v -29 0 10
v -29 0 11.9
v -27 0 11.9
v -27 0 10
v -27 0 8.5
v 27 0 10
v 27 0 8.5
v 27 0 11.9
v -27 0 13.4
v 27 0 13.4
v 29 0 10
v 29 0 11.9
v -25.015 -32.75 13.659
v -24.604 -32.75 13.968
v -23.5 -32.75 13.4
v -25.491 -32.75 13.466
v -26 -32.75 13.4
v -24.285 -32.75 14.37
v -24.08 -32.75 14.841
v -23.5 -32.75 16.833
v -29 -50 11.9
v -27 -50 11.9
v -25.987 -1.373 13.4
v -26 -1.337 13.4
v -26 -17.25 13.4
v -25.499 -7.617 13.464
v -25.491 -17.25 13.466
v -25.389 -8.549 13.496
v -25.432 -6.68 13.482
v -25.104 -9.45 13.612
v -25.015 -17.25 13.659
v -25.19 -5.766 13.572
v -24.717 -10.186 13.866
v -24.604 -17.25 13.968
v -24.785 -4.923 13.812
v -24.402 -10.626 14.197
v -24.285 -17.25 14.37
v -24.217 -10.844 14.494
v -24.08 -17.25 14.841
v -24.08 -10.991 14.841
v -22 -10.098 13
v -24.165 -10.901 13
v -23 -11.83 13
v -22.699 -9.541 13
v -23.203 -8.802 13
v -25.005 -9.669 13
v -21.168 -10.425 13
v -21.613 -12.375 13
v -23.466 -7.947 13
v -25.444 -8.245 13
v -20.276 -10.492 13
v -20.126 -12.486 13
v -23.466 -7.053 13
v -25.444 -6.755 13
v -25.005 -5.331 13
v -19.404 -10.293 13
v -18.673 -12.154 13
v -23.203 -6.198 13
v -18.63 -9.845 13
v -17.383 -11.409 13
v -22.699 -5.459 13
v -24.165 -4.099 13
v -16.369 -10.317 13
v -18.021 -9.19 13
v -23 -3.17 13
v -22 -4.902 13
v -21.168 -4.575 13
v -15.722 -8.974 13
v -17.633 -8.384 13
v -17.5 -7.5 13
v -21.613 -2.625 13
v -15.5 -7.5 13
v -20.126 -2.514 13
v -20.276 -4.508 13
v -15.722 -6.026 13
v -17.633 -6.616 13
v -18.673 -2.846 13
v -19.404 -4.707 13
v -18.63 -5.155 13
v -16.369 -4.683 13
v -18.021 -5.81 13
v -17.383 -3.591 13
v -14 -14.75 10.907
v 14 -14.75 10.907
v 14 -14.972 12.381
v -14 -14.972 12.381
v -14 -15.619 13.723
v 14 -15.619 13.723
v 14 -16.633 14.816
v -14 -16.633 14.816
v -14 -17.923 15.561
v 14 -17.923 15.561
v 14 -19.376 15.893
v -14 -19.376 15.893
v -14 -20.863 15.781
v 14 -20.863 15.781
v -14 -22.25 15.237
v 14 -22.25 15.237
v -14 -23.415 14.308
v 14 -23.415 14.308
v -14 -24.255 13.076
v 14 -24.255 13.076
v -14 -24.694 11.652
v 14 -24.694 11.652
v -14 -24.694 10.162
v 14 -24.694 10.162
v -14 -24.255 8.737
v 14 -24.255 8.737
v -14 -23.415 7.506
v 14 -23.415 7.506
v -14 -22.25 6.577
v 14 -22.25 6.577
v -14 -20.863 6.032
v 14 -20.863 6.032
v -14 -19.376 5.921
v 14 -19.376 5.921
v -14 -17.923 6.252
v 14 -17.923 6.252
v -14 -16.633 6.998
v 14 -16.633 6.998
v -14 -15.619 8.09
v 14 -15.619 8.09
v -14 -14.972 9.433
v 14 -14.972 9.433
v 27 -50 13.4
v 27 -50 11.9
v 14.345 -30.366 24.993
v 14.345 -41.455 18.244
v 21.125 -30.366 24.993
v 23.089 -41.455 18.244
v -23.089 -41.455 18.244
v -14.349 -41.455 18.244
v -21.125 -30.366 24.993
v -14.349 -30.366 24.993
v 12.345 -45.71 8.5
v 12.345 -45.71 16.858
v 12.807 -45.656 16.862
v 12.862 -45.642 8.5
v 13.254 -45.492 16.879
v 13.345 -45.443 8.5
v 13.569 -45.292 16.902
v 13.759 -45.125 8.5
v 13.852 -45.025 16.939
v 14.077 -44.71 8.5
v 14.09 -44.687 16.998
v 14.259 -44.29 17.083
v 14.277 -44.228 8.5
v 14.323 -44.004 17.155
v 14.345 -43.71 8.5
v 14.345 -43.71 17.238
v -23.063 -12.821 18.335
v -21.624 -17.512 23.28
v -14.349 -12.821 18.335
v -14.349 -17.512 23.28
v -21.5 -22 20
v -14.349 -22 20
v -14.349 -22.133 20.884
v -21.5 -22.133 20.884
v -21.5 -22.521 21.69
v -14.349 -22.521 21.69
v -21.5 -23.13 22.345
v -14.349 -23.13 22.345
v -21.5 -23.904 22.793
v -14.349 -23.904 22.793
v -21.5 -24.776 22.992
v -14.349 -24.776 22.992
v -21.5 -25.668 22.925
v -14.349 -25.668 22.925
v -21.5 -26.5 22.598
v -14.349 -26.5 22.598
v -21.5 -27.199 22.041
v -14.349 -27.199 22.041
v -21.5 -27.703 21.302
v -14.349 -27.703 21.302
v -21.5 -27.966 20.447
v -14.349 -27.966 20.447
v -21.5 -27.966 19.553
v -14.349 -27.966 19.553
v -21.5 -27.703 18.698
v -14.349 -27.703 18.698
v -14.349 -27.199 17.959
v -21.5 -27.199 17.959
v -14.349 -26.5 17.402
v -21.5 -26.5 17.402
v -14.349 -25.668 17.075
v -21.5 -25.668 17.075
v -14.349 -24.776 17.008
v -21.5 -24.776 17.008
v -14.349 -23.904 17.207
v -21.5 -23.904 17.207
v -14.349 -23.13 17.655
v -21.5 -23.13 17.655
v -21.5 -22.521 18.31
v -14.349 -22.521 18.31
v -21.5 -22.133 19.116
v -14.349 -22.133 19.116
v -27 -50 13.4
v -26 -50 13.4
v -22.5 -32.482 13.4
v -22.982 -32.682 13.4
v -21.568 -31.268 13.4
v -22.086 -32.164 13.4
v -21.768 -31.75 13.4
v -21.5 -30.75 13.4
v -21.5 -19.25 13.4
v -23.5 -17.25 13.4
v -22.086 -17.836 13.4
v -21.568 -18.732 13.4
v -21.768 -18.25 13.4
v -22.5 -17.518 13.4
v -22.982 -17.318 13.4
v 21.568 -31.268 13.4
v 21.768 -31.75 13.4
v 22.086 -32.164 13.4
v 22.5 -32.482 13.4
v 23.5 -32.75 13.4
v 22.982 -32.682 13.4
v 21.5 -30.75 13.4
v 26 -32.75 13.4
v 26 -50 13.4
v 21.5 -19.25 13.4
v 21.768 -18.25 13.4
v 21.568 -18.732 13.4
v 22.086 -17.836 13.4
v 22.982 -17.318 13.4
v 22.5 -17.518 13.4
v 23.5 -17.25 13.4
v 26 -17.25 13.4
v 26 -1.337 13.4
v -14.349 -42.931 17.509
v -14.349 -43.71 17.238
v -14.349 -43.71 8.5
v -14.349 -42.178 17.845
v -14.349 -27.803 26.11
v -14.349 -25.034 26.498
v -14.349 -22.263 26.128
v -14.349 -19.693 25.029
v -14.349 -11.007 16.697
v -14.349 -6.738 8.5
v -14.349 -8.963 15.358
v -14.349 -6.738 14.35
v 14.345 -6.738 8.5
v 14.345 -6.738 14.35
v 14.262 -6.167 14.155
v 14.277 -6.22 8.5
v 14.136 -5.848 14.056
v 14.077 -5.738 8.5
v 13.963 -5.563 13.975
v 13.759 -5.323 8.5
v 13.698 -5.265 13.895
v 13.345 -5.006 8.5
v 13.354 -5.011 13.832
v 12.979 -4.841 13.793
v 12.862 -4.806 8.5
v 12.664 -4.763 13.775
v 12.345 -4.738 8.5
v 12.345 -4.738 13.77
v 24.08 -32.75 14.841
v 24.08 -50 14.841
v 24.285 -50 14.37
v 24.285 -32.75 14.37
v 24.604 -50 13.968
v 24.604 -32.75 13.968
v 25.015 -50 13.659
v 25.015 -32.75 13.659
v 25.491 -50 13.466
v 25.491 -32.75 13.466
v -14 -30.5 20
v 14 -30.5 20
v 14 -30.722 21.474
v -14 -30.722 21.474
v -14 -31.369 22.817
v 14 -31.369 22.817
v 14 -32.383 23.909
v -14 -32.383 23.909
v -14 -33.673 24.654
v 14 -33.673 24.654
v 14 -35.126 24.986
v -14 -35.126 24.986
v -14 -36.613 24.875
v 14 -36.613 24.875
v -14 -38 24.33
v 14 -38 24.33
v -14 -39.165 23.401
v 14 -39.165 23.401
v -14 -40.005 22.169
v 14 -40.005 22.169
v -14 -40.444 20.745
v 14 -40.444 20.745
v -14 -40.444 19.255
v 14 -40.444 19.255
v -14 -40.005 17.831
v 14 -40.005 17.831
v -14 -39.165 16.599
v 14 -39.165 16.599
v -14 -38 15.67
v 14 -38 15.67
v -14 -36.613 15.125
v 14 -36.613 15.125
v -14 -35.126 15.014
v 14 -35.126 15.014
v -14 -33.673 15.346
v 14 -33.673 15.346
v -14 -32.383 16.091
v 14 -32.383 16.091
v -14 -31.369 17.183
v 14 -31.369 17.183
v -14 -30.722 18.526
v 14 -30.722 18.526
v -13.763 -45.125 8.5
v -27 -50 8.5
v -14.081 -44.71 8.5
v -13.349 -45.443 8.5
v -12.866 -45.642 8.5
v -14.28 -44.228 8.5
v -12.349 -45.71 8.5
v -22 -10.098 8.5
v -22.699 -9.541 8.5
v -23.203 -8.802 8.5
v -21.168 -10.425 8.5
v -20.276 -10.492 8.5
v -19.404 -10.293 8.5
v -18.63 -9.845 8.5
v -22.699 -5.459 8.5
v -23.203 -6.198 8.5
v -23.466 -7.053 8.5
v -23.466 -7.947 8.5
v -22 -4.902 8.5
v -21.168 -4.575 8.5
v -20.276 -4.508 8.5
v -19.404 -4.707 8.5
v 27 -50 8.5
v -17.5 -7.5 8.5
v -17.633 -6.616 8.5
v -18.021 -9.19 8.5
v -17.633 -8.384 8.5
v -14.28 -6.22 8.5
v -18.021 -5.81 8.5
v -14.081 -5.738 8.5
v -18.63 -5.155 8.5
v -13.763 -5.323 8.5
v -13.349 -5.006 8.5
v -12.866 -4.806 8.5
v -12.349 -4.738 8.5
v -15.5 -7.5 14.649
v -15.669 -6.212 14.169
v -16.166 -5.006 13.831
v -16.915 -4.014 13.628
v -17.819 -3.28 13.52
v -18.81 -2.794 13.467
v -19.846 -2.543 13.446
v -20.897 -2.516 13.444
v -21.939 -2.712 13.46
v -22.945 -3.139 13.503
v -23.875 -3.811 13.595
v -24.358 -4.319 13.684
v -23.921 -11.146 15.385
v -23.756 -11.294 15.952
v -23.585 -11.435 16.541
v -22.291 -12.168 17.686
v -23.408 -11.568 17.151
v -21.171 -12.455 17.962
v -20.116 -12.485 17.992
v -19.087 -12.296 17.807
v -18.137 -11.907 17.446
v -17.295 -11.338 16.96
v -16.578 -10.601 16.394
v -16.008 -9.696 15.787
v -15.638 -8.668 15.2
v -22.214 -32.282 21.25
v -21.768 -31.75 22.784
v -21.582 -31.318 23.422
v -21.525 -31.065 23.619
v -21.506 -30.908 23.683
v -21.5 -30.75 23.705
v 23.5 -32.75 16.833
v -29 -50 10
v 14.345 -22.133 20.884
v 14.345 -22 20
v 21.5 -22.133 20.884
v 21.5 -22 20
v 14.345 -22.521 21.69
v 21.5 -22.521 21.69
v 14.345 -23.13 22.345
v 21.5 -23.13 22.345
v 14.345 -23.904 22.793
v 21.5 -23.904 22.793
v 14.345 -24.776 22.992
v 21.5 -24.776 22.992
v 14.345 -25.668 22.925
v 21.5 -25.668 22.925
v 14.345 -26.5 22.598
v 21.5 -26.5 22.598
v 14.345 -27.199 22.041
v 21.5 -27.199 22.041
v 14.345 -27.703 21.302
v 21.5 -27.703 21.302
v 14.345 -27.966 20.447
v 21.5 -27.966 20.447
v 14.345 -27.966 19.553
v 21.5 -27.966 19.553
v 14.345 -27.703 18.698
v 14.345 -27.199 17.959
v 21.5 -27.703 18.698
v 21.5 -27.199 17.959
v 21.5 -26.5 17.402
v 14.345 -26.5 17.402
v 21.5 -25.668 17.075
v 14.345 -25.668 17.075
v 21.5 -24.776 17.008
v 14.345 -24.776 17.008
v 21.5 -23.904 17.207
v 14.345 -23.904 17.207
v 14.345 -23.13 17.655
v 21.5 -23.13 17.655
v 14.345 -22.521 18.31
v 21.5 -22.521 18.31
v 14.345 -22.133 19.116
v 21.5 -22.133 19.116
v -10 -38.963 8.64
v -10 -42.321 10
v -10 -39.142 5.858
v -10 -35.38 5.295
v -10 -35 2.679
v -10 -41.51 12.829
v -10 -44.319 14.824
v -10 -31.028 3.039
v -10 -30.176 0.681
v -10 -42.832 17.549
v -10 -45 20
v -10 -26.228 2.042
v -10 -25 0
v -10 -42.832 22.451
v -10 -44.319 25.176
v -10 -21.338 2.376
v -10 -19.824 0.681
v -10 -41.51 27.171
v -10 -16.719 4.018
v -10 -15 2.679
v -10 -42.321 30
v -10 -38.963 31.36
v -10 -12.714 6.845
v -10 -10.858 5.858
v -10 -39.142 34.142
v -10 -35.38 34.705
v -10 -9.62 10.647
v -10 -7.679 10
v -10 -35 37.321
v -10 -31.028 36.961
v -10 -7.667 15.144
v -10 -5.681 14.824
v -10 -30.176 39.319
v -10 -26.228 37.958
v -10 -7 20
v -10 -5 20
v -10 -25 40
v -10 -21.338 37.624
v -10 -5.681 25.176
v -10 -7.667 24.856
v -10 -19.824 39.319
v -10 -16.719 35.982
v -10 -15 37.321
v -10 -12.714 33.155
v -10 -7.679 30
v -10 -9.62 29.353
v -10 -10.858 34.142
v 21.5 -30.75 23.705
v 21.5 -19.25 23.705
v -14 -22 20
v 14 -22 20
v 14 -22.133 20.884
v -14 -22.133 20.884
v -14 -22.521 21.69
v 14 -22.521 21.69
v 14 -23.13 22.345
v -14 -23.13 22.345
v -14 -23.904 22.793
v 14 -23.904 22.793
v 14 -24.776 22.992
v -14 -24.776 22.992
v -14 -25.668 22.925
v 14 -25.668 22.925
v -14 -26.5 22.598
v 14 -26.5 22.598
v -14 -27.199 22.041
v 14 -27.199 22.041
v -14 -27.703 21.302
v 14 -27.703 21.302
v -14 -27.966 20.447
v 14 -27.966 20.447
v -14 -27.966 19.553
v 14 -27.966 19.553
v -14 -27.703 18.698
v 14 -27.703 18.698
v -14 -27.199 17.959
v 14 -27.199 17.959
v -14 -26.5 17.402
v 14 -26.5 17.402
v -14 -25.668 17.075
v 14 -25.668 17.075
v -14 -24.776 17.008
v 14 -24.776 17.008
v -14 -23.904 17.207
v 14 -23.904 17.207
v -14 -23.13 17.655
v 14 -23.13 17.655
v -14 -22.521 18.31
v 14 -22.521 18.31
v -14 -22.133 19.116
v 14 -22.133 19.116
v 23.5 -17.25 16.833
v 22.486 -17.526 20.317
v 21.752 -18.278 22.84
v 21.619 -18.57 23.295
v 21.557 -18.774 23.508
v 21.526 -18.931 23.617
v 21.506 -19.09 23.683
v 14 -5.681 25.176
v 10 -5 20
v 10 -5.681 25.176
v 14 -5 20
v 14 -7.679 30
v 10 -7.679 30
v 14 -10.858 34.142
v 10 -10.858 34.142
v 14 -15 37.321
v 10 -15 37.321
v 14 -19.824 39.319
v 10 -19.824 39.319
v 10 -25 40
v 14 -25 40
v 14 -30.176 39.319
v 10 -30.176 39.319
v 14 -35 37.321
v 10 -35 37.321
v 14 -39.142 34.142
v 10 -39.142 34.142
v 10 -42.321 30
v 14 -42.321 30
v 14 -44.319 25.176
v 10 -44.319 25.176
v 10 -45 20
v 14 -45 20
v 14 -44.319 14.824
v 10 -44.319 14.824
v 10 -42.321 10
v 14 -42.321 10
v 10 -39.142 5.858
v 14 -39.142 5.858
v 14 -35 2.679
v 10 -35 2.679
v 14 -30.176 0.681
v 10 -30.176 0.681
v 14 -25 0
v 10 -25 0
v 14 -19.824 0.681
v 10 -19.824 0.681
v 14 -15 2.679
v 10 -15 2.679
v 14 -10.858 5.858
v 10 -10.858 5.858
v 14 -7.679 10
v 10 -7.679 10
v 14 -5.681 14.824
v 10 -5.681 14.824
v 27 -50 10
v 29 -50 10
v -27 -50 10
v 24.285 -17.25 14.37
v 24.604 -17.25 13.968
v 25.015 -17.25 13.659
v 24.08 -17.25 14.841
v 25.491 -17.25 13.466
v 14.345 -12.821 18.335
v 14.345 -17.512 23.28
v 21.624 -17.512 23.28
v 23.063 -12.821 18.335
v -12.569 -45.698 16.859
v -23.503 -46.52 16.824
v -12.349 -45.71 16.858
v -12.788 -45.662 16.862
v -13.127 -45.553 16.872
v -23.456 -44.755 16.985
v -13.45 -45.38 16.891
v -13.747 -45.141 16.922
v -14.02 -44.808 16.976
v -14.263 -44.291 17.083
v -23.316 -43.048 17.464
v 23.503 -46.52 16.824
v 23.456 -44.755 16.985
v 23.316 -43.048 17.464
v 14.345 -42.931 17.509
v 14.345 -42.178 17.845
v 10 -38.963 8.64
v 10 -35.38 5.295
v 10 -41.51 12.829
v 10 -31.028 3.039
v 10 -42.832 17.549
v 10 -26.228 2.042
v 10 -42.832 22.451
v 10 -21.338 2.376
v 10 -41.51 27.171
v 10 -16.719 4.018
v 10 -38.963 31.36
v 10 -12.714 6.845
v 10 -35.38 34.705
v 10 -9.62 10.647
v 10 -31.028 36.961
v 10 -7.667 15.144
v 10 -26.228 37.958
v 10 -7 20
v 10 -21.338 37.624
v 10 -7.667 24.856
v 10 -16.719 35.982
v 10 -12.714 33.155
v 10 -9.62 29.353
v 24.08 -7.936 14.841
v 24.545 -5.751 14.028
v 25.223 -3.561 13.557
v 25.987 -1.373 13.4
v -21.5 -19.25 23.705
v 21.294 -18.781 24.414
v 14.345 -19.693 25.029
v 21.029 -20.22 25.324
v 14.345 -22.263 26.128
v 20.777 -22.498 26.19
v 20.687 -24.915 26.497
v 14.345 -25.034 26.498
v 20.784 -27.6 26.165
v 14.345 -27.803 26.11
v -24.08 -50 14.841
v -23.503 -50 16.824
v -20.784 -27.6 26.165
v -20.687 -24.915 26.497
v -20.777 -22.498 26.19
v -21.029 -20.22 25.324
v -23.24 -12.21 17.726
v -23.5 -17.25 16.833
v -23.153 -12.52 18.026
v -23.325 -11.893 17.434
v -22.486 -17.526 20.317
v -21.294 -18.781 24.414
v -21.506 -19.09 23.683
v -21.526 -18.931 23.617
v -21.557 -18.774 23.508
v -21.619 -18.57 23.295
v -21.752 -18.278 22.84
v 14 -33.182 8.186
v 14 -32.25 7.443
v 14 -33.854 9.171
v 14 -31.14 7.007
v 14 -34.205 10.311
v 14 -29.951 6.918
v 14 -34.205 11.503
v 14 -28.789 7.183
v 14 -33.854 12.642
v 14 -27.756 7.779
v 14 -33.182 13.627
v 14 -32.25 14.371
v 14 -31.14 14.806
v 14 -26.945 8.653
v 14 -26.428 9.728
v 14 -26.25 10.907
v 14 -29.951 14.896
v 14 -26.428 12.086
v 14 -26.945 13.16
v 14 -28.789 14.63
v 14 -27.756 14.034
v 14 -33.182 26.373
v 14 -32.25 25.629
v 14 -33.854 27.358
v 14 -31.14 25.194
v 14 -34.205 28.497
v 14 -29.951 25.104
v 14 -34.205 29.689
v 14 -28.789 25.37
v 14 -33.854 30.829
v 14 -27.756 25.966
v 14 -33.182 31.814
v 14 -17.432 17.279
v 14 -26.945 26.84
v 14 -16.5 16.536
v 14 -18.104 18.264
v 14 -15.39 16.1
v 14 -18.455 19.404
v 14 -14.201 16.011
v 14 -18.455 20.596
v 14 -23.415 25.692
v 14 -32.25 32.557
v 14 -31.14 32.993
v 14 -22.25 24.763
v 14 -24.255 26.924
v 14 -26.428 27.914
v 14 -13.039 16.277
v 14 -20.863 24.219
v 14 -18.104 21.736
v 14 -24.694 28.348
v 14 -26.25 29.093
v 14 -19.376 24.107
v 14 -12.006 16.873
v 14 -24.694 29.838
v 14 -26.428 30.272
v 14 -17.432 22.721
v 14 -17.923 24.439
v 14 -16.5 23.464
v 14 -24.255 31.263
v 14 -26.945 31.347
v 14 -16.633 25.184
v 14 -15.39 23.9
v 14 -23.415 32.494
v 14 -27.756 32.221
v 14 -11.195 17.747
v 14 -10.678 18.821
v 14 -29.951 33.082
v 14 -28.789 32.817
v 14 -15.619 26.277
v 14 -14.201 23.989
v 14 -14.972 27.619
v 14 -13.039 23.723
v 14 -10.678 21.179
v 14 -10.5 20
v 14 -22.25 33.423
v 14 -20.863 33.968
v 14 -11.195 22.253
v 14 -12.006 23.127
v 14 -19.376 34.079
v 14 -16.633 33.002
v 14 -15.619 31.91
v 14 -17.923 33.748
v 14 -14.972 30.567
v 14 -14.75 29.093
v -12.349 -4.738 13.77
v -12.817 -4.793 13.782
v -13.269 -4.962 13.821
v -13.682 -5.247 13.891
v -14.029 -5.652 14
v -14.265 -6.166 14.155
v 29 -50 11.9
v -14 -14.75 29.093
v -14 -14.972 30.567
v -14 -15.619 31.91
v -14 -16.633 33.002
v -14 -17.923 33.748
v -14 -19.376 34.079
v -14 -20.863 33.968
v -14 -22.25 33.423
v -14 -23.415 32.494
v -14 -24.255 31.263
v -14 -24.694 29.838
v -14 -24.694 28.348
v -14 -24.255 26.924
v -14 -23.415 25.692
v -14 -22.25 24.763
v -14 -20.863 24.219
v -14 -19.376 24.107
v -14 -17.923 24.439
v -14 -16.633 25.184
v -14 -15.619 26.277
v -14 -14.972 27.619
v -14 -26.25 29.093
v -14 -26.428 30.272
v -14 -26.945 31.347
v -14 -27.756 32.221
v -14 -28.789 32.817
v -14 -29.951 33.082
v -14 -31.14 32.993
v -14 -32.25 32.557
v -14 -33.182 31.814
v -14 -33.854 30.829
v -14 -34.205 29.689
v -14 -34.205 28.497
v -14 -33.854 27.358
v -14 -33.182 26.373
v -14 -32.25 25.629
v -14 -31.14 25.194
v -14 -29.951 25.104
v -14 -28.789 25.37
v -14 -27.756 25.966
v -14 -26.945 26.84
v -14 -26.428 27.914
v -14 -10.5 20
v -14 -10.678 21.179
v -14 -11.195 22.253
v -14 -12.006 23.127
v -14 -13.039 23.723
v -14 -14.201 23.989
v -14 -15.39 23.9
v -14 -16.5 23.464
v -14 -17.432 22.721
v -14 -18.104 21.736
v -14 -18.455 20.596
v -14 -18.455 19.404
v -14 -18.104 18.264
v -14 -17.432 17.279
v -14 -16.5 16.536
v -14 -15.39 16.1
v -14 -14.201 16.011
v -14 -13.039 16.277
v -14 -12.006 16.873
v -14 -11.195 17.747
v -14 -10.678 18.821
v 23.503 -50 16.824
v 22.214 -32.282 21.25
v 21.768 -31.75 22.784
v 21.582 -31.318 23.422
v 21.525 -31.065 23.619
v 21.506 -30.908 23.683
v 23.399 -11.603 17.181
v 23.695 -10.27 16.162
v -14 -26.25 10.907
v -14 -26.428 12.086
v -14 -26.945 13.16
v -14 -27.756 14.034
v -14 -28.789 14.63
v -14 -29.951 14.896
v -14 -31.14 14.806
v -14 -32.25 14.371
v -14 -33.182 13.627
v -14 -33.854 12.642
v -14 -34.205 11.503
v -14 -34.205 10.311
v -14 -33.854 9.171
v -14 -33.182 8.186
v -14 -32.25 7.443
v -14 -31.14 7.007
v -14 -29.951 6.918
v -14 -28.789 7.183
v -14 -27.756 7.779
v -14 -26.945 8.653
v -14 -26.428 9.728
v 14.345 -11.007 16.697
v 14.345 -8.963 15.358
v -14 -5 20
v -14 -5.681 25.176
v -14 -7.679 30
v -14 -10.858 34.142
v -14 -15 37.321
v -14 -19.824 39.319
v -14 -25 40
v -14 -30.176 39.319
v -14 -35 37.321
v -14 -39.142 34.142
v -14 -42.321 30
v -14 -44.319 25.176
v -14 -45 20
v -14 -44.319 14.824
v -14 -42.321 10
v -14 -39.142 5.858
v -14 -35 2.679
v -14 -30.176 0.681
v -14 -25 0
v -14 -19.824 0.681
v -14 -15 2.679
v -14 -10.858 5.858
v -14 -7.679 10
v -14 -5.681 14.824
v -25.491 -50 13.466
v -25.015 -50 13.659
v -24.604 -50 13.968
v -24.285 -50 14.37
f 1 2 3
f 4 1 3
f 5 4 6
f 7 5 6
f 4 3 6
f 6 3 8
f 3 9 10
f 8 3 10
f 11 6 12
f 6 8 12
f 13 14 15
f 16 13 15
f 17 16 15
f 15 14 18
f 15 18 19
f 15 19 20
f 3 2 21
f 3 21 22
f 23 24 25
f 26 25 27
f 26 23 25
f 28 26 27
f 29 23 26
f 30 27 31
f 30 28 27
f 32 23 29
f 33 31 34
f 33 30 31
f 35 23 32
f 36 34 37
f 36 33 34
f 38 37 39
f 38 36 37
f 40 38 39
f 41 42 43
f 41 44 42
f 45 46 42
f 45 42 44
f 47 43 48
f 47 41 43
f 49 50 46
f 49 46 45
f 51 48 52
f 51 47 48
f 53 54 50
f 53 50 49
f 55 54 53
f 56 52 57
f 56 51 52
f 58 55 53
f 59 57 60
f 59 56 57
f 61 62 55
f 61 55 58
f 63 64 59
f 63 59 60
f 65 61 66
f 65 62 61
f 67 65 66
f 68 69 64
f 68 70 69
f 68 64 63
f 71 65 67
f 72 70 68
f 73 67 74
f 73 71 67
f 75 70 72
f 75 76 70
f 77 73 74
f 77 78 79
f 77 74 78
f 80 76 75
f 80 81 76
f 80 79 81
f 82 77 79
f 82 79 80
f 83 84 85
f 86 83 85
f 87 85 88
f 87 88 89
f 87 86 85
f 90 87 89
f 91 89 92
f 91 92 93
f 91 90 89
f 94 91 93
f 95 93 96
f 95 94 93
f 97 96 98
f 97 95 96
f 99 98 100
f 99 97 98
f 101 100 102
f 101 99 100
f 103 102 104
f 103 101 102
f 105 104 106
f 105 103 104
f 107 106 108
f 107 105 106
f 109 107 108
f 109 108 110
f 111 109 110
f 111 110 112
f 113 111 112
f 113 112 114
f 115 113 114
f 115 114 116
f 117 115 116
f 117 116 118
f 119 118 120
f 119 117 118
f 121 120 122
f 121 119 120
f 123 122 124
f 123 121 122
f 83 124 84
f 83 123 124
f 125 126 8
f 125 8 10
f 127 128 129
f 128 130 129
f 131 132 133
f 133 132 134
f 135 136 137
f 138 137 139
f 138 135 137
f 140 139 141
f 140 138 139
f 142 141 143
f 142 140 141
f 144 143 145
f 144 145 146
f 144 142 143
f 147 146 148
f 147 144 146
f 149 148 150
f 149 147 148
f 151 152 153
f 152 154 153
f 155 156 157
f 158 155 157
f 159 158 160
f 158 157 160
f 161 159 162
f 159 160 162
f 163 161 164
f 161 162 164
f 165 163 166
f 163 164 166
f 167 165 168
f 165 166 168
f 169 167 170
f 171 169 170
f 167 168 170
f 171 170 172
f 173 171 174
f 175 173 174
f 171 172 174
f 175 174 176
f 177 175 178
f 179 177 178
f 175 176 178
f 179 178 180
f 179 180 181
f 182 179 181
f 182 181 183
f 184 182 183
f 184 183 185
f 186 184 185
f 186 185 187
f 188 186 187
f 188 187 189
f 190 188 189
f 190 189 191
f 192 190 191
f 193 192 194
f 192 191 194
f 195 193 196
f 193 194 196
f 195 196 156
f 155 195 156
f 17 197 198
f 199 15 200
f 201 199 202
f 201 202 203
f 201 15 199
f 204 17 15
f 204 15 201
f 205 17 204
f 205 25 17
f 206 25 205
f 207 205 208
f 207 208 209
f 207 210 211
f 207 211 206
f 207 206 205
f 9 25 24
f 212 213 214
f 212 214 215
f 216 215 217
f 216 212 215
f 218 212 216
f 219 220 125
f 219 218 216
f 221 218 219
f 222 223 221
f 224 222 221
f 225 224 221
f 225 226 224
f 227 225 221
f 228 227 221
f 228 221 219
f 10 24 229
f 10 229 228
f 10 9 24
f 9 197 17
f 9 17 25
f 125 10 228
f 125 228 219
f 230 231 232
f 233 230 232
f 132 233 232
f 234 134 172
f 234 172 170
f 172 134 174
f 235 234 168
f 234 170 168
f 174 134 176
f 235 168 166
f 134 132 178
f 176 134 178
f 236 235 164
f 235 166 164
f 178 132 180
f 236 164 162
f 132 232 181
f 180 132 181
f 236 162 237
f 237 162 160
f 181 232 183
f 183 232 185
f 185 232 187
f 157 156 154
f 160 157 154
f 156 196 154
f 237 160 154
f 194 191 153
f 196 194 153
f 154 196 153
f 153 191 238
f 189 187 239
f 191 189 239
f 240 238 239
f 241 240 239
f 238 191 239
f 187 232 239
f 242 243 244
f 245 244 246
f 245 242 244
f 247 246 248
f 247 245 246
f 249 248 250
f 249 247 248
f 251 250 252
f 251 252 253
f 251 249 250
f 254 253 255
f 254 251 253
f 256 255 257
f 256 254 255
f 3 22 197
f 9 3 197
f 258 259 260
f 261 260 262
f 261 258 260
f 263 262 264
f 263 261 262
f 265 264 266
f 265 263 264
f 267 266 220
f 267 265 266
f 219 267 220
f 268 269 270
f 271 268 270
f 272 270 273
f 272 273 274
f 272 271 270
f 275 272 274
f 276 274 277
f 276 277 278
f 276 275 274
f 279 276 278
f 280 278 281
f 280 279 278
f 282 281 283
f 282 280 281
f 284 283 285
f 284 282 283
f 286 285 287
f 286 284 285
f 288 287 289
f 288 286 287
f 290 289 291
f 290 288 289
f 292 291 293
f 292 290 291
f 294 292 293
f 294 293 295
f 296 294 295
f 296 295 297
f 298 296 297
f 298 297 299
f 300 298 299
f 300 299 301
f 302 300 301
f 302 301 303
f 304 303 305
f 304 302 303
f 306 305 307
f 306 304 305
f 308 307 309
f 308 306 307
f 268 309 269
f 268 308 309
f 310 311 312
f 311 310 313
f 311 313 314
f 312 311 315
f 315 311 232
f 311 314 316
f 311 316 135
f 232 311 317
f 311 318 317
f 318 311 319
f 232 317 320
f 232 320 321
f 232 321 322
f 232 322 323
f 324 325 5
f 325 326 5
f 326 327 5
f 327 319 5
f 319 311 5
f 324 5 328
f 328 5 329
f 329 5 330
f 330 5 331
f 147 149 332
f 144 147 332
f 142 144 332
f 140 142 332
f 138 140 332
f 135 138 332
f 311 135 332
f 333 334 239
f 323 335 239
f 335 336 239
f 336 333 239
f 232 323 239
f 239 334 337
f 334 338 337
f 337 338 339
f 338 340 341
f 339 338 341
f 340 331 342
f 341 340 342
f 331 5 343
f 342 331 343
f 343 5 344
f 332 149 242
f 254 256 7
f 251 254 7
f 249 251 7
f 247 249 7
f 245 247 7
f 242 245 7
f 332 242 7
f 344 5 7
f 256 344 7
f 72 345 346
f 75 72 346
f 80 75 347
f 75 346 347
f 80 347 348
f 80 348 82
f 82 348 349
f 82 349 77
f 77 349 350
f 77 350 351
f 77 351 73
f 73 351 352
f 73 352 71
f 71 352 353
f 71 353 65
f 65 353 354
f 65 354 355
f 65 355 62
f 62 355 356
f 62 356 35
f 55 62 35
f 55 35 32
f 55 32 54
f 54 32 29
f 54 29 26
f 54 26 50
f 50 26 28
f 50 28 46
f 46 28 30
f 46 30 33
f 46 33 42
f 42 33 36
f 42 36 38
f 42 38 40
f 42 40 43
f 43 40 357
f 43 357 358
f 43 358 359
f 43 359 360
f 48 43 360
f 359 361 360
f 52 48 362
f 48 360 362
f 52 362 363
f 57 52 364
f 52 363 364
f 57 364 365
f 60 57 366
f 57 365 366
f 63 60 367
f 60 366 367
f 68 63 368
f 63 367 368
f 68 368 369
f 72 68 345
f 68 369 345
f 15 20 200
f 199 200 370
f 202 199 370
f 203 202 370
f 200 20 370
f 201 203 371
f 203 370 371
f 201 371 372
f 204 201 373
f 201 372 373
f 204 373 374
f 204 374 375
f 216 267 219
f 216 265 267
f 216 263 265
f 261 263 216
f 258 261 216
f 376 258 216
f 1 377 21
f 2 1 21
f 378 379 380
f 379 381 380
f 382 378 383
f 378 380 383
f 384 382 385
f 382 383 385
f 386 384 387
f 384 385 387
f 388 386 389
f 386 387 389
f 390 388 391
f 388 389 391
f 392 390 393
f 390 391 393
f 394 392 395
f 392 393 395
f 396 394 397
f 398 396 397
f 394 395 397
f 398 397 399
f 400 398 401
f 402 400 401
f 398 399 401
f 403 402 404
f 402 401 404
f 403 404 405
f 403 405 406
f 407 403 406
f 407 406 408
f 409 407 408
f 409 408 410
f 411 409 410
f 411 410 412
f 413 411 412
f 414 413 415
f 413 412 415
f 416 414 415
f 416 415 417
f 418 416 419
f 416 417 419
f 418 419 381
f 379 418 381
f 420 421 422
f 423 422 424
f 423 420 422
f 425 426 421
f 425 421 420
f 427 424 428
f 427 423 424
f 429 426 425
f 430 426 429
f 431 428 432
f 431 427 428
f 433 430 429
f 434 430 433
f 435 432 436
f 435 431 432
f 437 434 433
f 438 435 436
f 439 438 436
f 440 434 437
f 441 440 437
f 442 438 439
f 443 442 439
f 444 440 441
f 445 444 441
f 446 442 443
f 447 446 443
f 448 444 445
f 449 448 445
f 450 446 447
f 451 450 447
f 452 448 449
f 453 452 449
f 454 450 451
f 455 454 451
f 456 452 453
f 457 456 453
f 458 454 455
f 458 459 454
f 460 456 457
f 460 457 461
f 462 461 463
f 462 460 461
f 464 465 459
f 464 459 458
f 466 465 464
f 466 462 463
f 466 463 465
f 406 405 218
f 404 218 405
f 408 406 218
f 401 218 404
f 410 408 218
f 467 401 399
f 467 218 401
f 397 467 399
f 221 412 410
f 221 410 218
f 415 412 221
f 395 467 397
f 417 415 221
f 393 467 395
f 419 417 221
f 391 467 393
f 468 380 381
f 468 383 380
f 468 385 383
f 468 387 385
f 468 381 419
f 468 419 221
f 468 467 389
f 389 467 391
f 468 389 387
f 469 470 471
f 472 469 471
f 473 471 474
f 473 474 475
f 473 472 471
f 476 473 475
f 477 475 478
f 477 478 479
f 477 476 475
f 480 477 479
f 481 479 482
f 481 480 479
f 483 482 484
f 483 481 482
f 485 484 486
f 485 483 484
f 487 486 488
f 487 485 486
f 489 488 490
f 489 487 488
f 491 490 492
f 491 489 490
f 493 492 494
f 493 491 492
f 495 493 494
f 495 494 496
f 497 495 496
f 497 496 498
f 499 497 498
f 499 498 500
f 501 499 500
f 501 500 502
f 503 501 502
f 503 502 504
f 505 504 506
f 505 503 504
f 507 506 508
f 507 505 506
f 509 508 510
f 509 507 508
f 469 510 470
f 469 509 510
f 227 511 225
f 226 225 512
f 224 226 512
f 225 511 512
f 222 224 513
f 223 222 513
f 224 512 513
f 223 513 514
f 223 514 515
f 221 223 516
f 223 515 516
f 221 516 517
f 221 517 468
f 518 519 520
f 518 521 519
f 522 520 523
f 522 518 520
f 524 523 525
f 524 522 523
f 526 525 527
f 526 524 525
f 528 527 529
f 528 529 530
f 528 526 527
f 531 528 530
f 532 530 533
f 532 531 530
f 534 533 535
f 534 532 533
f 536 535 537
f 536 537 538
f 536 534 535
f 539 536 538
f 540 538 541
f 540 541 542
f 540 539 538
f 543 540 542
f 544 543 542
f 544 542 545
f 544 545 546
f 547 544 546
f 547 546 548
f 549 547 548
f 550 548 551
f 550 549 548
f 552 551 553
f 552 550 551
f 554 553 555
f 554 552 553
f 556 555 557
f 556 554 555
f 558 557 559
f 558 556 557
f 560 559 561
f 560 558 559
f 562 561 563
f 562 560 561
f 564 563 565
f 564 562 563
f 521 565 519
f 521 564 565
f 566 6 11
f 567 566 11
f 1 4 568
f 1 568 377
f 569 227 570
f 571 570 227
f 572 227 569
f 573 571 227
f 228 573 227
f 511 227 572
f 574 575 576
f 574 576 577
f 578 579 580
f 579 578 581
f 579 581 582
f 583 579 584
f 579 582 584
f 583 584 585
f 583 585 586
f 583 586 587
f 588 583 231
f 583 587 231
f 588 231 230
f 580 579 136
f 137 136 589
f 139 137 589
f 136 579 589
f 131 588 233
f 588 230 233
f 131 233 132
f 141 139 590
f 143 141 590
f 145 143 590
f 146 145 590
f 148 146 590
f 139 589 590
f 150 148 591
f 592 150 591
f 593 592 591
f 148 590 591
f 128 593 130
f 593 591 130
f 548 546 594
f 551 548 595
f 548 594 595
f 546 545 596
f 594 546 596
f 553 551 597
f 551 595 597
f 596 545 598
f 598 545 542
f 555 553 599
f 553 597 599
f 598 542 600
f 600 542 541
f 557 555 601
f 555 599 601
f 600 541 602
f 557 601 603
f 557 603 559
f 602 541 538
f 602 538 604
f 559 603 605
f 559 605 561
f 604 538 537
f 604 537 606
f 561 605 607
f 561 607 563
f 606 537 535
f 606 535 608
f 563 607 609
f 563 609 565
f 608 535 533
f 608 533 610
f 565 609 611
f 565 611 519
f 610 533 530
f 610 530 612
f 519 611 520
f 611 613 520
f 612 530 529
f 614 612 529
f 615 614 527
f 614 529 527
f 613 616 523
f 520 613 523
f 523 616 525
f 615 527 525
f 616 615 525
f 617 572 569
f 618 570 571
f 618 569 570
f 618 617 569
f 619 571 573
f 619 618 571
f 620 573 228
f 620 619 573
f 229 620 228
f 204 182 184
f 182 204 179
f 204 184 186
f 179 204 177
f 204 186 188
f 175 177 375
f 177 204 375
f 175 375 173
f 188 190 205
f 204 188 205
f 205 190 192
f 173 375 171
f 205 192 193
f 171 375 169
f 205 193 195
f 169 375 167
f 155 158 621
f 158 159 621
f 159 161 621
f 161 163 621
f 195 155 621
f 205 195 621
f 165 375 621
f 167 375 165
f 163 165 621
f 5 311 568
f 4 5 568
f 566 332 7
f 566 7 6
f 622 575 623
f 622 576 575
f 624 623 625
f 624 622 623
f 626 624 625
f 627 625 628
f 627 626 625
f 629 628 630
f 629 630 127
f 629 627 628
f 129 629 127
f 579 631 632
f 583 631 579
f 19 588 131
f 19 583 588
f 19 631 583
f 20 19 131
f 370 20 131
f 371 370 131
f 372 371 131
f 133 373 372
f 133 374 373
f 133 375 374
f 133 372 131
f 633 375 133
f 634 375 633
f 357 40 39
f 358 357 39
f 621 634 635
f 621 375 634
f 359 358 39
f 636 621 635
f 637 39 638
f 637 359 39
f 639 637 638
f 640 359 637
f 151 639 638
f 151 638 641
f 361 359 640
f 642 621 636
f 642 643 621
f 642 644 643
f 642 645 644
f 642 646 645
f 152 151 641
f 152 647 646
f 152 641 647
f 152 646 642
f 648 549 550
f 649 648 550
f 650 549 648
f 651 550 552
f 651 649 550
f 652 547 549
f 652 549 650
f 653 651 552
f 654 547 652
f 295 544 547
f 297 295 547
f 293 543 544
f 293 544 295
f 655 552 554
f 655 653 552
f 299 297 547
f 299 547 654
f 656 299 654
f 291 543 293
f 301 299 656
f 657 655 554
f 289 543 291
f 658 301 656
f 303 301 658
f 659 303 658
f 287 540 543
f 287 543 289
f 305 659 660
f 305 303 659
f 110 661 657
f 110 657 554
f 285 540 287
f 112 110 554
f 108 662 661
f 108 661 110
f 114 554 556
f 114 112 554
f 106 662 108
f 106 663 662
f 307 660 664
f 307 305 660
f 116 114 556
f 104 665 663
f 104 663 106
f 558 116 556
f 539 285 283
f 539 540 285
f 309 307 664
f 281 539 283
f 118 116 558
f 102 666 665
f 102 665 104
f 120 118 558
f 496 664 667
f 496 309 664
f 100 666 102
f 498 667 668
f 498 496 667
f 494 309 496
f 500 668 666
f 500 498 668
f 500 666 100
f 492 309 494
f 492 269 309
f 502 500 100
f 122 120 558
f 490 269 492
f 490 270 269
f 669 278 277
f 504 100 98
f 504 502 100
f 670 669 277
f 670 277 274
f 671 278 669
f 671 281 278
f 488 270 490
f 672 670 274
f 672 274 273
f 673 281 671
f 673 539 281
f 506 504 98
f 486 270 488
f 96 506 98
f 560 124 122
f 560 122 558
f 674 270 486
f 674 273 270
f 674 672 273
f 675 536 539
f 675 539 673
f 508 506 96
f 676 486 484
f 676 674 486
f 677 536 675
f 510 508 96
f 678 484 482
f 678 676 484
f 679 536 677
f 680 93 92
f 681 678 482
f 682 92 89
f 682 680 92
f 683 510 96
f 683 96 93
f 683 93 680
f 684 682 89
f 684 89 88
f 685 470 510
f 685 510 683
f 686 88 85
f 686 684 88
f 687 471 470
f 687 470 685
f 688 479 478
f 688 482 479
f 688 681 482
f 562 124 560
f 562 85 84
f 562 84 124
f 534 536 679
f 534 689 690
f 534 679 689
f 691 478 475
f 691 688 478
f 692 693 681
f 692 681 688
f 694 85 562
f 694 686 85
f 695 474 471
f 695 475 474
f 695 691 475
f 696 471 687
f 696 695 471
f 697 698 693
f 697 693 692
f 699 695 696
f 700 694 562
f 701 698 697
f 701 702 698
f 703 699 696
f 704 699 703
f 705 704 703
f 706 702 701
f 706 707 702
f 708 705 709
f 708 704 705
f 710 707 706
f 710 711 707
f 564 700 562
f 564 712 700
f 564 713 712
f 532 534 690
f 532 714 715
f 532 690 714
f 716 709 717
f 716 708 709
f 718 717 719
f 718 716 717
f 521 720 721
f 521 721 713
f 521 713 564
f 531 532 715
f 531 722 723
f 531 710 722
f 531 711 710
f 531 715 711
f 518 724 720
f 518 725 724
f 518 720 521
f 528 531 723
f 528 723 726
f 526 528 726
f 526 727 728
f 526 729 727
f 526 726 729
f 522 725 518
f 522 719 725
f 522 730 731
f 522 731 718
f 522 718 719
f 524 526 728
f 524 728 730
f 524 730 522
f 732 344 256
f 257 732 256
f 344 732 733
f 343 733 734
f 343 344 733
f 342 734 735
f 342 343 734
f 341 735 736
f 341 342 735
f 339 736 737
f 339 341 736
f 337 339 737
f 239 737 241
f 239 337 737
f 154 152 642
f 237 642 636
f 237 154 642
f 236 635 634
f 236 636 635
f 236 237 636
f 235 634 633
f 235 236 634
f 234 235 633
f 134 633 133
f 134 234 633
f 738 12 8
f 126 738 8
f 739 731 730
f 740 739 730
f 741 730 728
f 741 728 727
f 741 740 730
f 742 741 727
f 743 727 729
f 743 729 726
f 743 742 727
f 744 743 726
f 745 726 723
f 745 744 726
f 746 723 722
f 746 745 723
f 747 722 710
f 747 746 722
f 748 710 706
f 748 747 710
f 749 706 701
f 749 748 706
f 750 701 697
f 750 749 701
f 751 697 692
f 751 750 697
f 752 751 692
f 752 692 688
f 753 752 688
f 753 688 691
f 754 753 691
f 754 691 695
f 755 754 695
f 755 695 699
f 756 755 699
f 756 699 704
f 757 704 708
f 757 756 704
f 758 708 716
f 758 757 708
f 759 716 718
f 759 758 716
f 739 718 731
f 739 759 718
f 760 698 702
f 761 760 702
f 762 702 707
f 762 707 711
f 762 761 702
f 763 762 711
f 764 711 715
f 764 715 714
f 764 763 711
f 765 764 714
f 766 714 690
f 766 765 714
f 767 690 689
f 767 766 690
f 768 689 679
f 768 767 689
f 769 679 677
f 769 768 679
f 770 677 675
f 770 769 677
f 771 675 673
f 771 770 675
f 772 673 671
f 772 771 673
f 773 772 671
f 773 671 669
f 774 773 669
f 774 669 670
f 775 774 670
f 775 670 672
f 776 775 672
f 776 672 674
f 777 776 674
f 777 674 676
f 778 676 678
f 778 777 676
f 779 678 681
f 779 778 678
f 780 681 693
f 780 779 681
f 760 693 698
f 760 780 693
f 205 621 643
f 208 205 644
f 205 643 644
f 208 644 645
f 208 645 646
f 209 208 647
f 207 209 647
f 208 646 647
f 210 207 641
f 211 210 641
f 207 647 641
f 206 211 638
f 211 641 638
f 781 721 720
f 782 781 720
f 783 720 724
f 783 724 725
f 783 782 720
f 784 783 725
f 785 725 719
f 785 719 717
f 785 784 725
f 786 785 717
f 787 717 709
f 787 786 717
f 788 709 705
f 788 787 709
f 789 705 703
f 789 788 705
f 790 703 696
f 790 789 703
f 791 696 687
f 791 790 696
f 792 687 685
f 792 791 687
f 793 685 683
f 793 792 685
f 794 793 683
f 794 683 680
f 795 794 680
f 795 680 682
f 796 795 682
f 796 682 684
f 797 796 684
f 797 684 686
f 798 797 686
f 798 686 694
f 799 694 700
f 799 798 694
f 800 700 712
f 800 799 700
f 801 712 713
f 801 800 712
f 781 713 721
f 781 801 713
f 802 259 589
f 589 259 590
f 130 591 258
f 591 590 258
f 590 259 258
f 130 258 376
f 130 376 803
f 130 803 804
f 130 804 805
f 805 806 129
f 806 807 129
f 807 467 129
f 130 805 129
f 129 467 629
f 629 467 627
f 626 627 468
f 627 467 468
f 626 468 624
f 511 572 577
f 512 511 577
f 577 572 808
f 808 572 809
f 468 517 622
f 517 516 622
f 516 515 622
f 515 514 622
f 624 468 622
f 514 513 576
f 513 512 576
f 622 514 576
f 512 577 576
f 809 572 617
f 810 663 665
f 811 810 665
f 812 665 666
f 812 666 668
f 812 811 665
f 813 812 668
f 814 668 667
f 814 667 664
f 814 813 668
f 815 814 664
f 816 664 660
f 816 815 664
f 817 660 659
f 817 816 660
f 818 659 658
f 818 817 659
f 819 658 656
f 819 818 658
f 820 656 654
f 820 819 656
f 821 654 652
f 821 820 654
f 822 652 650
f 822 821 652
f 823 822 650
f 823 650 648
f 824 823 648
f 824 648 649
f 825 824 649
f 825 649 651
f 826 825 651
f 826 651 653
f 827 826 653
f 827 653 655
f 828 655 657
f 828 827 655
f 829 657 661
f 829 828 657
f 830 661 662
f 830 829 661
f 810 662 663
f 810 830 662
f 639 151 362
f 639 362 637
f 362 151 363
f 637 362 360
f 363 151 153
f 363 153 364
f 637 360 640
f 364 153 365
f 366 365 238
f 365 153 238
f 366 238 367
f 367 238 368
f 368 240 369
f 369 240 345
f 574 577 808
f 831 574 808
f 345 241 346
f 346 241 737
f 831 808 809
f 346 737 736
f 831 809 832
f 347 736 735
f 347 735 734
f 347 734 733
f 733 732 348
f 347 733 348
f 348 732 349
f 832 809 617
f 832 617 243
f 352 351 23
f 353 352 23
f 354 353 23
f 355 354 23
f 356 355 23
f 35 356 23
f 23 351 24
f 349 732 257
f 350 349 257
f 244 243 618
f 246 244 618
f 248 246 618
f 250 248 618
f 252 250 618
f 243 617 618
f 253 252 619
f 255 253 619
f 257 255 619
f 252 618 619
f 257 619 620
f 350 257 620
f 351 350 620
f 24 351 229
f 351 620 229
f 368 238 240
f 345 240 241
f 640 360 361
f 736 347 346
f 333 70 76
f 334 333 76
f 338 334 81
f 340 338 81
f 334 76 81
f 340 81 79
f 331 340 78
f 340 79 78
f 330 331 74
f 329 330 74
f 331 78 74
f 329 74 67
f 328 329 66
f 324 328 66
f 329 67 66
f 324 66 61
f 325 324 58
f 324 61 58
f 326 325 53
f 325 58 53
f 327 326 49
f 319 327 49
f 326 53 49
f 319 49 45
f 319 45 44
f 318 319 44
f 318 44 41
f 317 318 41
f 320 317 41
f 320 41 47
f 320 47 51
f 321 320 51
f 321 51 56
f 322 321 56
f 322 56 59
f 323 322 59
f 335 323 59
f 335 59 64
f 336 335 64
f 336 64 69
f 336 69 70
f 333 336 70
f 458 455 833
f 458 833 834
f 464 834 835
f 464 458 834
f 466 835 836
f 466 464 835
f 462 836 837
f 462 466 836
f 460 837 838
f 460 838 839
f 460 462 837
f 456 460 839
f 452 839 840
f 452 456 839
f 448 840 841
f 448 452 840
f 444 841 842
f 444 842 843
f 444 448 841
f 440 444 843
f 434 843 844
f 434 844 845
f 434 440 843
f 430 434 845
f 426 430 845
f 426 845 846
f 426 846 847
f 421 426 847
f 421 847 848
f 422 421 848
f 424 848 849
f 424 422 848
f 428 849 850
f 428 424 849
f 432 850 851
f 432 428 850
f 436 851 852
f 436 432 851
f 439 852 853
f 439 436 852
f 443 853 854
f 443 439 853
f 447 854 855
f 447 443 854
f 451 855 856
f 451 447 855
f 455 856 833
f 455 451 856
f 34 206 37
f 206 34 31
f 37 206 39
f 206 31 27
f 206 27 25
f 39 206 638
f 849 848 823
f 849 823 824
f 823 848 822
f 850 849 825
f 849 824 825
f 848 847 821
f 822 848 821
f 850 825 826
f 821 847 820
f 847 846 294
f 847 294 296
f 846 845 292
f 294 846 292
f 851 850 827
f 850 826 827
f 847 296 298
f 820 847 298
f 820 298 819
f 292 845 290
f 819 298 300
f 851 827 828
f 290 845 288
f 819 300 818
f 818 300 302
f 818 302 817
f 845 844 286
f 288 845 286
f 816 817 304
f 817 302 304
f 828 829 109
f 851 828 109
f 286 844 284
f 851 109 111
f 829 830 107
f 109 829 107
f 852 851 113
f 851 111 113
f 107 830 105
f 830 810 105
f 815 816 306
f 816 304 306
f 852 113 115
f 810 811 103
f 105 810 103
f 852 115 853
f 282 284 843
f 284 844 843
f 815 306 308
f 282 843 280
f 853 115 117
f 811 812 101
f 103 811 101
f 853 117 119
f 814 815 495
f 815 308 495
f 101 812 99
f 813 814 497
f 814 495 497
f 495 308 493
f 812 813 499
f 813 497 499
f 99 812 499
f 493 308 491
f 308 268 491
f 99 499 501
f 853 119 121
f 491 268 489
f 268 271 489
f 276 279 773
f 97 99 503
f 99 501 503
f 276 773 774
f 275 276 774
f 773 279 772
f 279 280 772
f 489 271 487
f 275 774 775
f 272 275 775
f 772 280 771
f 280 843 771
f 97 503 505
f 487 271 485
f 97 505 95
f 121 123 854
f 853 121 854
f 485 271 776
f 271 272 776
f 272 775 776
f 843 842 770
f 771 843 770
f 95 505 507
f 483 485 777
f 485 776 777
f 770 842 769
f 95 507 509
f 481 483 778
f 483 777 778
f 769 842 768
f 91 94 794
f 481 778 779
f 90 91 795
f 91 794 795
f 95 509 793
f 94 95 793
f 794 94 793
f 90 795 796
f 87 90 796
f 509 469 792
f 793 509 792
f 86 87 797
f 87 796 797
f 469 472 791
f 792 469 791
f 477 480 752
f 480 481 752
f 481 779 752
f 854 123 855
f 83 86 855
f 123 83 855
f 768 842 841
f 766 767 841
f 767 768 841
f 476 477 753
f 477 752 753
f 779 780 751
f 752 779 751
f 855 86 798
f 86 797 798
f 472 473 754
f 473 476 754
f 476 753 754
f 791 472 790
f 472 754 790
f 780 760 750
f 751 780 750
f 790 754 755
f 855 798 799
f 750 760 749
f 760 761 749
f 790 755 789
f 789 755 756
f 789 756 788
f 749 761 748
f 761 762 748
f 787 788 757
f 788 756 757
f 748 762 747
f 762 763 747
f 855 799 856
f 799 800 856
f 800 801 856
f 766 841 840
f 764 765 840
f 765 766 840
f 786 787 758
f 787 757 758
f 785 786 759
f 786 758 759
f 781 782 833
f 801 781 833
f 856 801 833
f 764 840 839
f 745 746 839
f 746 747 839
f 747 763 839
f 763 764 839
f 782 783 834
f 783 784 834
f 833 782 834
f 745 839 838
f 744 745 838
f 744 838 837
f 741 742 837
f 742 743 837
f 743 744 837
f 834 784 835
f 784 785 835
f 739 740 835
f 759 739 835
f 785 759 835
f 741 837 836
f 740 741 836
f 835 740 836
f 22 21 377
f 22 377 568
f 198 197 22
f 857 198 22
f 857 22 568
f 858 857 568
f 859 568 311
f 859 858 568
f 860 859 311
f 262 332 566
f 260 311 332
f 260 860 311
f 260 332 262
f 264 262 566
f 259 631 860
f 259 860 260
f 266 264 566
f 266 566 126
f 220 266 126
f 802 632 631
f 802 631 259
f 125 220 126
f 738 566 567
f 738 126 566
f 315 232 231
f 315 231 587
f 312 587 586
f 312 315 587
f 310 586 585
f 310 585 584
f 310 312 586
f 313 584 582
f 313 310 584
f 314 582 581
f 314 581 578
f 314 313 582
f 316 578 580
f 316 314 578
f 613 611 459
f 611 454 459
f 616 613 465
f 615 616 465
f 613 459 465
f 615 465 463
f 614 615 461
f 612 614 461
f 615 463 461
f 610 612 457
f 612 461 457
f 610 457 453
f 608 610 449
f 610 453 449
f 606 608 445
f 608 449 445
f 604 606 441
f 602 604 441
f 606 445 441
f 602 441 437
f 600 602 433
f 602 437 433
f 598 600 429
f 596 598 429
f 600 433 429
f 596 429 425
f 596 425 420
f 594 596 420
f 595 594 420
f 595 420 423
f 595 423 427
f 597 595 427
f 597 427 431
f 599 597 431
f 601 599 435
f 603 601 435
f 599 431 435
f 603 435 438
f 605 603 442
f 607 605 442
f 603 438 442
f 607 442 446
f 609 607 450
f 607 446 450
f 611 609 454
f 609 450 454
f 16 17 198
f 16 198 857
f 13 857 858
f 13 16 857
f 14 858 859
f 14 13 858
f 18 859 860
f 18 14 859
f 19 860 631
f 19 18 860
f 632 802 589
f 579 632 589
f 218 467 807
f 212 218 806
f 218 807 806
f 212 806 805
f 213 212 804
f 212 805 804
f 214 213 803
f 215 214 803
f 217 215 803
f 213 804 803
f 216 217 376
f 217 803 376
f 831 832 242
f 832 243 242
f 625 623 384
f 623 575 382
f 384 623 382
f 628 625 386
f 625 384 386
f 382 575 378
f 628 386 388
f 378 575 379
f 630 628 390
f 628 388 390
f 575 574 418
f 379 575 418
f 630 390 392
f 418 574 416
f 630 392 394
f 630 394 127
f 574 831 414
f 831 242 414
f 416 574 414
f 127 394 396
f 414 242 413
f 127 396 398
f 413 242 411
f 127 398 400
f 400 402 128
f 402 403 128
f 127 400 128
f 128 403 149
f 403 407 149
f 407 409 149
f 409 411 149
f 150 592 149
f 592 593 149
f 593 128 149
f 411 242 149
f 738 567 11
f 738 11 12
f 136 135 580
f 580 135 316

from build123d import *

# Parameters (mm, degrees)
SKETCH001_R          = 20
SKETCH001_R_2        = 3
SKETCH001_R_3        = 5
SKETCH001_R_4        = 4
PAD_DEPTH            = 14
SKETCH002_R          = 20
SKETCH002_R_2        = 18
POCKET_DEPTH         = 10
PAD001_DEPTH         = 50
SKETCH004_R          = 3
POCKET001_DEPTH      = 29.001
POCKET001_DEPTH_BACK = -29.001
POCKET002_DEPTH      = 14.6
POCKET003_DEPTH      = 26.498744
POCKET003_DEPTH_BACK = 0.001
SKETCH007_R          = 5
POCKET004_DEPTH      = 5
SKETCH008_R          = 3
POCKET005_DEPTH      = 9.501


with BuildPart() as spoolbody:
    # Sketch001 → Pad (new body, symmetric)
    with BuildSketch(Plane.YZ):
        with Locations((-25, 20)):
            Circle(SKETCH001_R)
        with Locations((-25, 20)):
            Circle(SKETCH001_R_2, mode=Mode.SUBTRACT)
        with Locations((-19.75, 29.093267)):
            Circle(SKETCH001_R_3, mode=Mode.SUBTRACT)
        with Locations((-14.5, 20)):
            Circle(SKETCH001_R_4, mode=Mode.SUBTRACT)
        with Locations((-19.75, 10.906733)):
            Circle(SKETCH001_R_3, mode=Mode.SUBTRACT)
        with Locations((-30.25, 10.906733)):
            Circle(SKETCH001_R_4, mode=Mode.SUBTRACT)
        with Locations((-35.5, 20)):
            Circle(SKETCH001_R_3, mode=Mode.SUBTRACT)
        with Locations((-30.25, 29.093267)):
            Circle(SKETCH001_R_4, mode=Mode.SUBTRACT)
    extrude(amount=PAD_DEPTH, both=True)

    # Sketch002 → Pocket (cut, symmetric)
    with BuildSketch(Plane.YZ):
        with Locations((-25, 20)):
            Circle(SKETCH002_R)
        with Locations((-25, 20)):
            Circle(SKETCH002_R_2, mode=Mode.SUBTRACT)
    extrude(amount=POCKET_DEPTH, both=True, mode=Mode.SUBTRACT)


with BuildPart() as pusherbody:
    # Sketch003 → Pad001 (new body)
    with BuildSketch(Plane.XZ):
        with BuildLine():
            Line((27, 8.5), (27, 10))
            Line((27, 10), (29, 10))
            Line((29, 10), (29, 11.9))
            Line((29, 11.9), (27, 11.9))
            Line((27, 11.9), (27, 13.4))
            Line((27, 13.4), (26, 13.4))
            ThreePointArc((24.079673, 14.841121), (24.799533, 13.80035), (26, 13.4))
            Line((24.079673, 14.841121), (20.25, 28))
            Line((20.25, 28), (14.25, 28))
            Line((14.25, 28), (-14.25, 28))
            Line((-20.25, 28), (-14.25, 28))
            Line((-24.079673, 14.841121), (-20.25, 28))
            ThreePointArc((-26, 13.4), (-24.799533, 13.80035), (-24.079673, 14.841121))
            Line((-27, 13.4), (-26, 13.4))
            Line((-27, 11.9), (-27, 13.4))
            Line((-29, 11.9), (-27, 11.9))
            Line((-29, 10), (-29, 11.9))
            Line((-27, 10), (-29, 10))
            Line((-27, 8.5), (-27, 10))
            Line((-27, 8.5), (27, 8.5))
        make_face()
    extrude(amount=PAD001_DEPTH)

    # Sketch004 → Pocket001 (cut, two sides)
    with BuildSketch(Plane.YZ) as pocket001_sk:
        with Locations((-25, 20)):
            Circle(SKETCH004_R)
        with BuildLine():
            Line((-41.455289, 18.244235), (-30.366178, 24.993165))
            ThreePointArc((-17.511769, 23.279838), (-23.636311, 26.407263), (-30.366178, 24.993165))
            Line((-17.511769, 23.279838), (-12.820988, 18.335207))
            ThreePointArc((-12.820988, 18.335207), (-7.5865, 14.686041), (-1.33651, 13.4))
            Line((-1.33651, 13.4), (5.509181, 13.4))
            Line((5.509181, 13.4), (5.509181, 39.590982))
            Line((5.509181, 39.590982), (-54.900341, 39.590982))
            Line((-54.900341, 39.590982), (-54.900341, 16.824051))
            Line((-54.900341, 16.824051), (-46.520466, 16.824051))
            ThreePointArc((-46.520466, 16.824051), (-43.890212, 17.185813), (-41.455289, 18.244235))
        make_face()
    extrude(amount=-POCKET001_DEPTH, mode=Mode.SUBTRACT)
    extrude(pocket001_sk.sketch, amount=-POCKET001_DEPTH_BACK, mode=Mode.SUBTRACT)

    # Sketch005 (on DatumPlane) → Pocket002 (cut)
    with BuildSketch(Plane(origin=(0, 0, 28), x_dir=(-1, 0, 0), z_dir=(0, 0, 1))):
        with BuildLine():
            Line((-29, 32.75), (-23.5, 32.75))
            ThreePointArc((-21.5, 30.75), (-22.085786, 32.164214), (-23.5, 32.75))
            Line((-21.5, 30.75), (-21.5, 19.25))
            ThreePointArc((-23.5, 17.25), (-22.085786, 17.835786), (-21.5, 19.25))
            Line((-23.5, 17.25), (-29, 17.25))
            Line((-29, 17.25), (-29, 32.75))
        make_face()
        with BuildLine():
            Line((29, 32.75), (23.5, 32.75))
            ThreePointArc((23.5, 32.75), (22.085786, 32.164214), (21.5, 30.75))
            Line((21.5, 30.75), (21.5, 19.25))
            ThreePointArc((21.5, 19.25), (22.085786, 17.835786), (23.5, 17.25))
            Line((23.5, 17.25), (29, 17.25))
            Line((29, 17.25), (29, 32.75))
        make_face()
    extrude(amount=-POCKET002_DEPTH, mode=Mode.SUBTRACT)

    # Sketch006 → Pocket003 (cut, two sides)
    with BuildSketch(Plane.XY) as pocket003_sk:
        with BuildLine():
            Line((-12.34859, -4.737564), (12.344679, -4.737564))
            ThreePointArc((14.344679, -6.737564), (13.758893, -5.32335), (12.344679, -4.737564))
            Line((14.344679, -6.737564), (14.344679, -43.710464))
            ThreePointArc((12.344679, -45.710464), (13.758893, -45.124678), (14.344679, -43.710464))
            Line((12.344679, -45.710464), (-12.34859, -45.710464))
            ThreePointArc((-14.34859, -43.710464), (-13.762803, -45.124678), (-12.34859, -45.710464))
            Line((-14.34859, -43.710464), (-14.34859, -6.737564))
            ThreePointArc((-12.34859, -4.737564), (-13.762803, -5.32335), (-14.34859, -6.737564))
        make_face()
    extrude(amount=POCKET003_DEPTH, mode=Mode.SUBTRACT)
    extrude(pocket003_sk.sketch, amount=-POCKET003_DEPTH_BACK, mode=Mode.SUBTRACT)

    # Sketch007 (on DatumPlane) → Pocket004 (cut, symmetric)
    with BuildSketch(Plane.XY.offset(18)):
        with Locations((-20.5, -7.5)):
            Circle(SKETCH007_R)
    extrude(amount=POCKET004_DEPTH, both=True, mode=Mode.SUBTRACT)

    # Sketch008 (on DatumPlane) → Pocket005 (cut, through all)
    with BuildSketch(Plane.XY.offset(18)):
        with Locations((-20.5, -7.5)):
            Circle(SKETCH008_R)
    extrude(amount=-POCKET005_DEPTH, mode=Mode.SUBTRACT)


solid = Compound([spoolbody.part, pusherbody.part])
